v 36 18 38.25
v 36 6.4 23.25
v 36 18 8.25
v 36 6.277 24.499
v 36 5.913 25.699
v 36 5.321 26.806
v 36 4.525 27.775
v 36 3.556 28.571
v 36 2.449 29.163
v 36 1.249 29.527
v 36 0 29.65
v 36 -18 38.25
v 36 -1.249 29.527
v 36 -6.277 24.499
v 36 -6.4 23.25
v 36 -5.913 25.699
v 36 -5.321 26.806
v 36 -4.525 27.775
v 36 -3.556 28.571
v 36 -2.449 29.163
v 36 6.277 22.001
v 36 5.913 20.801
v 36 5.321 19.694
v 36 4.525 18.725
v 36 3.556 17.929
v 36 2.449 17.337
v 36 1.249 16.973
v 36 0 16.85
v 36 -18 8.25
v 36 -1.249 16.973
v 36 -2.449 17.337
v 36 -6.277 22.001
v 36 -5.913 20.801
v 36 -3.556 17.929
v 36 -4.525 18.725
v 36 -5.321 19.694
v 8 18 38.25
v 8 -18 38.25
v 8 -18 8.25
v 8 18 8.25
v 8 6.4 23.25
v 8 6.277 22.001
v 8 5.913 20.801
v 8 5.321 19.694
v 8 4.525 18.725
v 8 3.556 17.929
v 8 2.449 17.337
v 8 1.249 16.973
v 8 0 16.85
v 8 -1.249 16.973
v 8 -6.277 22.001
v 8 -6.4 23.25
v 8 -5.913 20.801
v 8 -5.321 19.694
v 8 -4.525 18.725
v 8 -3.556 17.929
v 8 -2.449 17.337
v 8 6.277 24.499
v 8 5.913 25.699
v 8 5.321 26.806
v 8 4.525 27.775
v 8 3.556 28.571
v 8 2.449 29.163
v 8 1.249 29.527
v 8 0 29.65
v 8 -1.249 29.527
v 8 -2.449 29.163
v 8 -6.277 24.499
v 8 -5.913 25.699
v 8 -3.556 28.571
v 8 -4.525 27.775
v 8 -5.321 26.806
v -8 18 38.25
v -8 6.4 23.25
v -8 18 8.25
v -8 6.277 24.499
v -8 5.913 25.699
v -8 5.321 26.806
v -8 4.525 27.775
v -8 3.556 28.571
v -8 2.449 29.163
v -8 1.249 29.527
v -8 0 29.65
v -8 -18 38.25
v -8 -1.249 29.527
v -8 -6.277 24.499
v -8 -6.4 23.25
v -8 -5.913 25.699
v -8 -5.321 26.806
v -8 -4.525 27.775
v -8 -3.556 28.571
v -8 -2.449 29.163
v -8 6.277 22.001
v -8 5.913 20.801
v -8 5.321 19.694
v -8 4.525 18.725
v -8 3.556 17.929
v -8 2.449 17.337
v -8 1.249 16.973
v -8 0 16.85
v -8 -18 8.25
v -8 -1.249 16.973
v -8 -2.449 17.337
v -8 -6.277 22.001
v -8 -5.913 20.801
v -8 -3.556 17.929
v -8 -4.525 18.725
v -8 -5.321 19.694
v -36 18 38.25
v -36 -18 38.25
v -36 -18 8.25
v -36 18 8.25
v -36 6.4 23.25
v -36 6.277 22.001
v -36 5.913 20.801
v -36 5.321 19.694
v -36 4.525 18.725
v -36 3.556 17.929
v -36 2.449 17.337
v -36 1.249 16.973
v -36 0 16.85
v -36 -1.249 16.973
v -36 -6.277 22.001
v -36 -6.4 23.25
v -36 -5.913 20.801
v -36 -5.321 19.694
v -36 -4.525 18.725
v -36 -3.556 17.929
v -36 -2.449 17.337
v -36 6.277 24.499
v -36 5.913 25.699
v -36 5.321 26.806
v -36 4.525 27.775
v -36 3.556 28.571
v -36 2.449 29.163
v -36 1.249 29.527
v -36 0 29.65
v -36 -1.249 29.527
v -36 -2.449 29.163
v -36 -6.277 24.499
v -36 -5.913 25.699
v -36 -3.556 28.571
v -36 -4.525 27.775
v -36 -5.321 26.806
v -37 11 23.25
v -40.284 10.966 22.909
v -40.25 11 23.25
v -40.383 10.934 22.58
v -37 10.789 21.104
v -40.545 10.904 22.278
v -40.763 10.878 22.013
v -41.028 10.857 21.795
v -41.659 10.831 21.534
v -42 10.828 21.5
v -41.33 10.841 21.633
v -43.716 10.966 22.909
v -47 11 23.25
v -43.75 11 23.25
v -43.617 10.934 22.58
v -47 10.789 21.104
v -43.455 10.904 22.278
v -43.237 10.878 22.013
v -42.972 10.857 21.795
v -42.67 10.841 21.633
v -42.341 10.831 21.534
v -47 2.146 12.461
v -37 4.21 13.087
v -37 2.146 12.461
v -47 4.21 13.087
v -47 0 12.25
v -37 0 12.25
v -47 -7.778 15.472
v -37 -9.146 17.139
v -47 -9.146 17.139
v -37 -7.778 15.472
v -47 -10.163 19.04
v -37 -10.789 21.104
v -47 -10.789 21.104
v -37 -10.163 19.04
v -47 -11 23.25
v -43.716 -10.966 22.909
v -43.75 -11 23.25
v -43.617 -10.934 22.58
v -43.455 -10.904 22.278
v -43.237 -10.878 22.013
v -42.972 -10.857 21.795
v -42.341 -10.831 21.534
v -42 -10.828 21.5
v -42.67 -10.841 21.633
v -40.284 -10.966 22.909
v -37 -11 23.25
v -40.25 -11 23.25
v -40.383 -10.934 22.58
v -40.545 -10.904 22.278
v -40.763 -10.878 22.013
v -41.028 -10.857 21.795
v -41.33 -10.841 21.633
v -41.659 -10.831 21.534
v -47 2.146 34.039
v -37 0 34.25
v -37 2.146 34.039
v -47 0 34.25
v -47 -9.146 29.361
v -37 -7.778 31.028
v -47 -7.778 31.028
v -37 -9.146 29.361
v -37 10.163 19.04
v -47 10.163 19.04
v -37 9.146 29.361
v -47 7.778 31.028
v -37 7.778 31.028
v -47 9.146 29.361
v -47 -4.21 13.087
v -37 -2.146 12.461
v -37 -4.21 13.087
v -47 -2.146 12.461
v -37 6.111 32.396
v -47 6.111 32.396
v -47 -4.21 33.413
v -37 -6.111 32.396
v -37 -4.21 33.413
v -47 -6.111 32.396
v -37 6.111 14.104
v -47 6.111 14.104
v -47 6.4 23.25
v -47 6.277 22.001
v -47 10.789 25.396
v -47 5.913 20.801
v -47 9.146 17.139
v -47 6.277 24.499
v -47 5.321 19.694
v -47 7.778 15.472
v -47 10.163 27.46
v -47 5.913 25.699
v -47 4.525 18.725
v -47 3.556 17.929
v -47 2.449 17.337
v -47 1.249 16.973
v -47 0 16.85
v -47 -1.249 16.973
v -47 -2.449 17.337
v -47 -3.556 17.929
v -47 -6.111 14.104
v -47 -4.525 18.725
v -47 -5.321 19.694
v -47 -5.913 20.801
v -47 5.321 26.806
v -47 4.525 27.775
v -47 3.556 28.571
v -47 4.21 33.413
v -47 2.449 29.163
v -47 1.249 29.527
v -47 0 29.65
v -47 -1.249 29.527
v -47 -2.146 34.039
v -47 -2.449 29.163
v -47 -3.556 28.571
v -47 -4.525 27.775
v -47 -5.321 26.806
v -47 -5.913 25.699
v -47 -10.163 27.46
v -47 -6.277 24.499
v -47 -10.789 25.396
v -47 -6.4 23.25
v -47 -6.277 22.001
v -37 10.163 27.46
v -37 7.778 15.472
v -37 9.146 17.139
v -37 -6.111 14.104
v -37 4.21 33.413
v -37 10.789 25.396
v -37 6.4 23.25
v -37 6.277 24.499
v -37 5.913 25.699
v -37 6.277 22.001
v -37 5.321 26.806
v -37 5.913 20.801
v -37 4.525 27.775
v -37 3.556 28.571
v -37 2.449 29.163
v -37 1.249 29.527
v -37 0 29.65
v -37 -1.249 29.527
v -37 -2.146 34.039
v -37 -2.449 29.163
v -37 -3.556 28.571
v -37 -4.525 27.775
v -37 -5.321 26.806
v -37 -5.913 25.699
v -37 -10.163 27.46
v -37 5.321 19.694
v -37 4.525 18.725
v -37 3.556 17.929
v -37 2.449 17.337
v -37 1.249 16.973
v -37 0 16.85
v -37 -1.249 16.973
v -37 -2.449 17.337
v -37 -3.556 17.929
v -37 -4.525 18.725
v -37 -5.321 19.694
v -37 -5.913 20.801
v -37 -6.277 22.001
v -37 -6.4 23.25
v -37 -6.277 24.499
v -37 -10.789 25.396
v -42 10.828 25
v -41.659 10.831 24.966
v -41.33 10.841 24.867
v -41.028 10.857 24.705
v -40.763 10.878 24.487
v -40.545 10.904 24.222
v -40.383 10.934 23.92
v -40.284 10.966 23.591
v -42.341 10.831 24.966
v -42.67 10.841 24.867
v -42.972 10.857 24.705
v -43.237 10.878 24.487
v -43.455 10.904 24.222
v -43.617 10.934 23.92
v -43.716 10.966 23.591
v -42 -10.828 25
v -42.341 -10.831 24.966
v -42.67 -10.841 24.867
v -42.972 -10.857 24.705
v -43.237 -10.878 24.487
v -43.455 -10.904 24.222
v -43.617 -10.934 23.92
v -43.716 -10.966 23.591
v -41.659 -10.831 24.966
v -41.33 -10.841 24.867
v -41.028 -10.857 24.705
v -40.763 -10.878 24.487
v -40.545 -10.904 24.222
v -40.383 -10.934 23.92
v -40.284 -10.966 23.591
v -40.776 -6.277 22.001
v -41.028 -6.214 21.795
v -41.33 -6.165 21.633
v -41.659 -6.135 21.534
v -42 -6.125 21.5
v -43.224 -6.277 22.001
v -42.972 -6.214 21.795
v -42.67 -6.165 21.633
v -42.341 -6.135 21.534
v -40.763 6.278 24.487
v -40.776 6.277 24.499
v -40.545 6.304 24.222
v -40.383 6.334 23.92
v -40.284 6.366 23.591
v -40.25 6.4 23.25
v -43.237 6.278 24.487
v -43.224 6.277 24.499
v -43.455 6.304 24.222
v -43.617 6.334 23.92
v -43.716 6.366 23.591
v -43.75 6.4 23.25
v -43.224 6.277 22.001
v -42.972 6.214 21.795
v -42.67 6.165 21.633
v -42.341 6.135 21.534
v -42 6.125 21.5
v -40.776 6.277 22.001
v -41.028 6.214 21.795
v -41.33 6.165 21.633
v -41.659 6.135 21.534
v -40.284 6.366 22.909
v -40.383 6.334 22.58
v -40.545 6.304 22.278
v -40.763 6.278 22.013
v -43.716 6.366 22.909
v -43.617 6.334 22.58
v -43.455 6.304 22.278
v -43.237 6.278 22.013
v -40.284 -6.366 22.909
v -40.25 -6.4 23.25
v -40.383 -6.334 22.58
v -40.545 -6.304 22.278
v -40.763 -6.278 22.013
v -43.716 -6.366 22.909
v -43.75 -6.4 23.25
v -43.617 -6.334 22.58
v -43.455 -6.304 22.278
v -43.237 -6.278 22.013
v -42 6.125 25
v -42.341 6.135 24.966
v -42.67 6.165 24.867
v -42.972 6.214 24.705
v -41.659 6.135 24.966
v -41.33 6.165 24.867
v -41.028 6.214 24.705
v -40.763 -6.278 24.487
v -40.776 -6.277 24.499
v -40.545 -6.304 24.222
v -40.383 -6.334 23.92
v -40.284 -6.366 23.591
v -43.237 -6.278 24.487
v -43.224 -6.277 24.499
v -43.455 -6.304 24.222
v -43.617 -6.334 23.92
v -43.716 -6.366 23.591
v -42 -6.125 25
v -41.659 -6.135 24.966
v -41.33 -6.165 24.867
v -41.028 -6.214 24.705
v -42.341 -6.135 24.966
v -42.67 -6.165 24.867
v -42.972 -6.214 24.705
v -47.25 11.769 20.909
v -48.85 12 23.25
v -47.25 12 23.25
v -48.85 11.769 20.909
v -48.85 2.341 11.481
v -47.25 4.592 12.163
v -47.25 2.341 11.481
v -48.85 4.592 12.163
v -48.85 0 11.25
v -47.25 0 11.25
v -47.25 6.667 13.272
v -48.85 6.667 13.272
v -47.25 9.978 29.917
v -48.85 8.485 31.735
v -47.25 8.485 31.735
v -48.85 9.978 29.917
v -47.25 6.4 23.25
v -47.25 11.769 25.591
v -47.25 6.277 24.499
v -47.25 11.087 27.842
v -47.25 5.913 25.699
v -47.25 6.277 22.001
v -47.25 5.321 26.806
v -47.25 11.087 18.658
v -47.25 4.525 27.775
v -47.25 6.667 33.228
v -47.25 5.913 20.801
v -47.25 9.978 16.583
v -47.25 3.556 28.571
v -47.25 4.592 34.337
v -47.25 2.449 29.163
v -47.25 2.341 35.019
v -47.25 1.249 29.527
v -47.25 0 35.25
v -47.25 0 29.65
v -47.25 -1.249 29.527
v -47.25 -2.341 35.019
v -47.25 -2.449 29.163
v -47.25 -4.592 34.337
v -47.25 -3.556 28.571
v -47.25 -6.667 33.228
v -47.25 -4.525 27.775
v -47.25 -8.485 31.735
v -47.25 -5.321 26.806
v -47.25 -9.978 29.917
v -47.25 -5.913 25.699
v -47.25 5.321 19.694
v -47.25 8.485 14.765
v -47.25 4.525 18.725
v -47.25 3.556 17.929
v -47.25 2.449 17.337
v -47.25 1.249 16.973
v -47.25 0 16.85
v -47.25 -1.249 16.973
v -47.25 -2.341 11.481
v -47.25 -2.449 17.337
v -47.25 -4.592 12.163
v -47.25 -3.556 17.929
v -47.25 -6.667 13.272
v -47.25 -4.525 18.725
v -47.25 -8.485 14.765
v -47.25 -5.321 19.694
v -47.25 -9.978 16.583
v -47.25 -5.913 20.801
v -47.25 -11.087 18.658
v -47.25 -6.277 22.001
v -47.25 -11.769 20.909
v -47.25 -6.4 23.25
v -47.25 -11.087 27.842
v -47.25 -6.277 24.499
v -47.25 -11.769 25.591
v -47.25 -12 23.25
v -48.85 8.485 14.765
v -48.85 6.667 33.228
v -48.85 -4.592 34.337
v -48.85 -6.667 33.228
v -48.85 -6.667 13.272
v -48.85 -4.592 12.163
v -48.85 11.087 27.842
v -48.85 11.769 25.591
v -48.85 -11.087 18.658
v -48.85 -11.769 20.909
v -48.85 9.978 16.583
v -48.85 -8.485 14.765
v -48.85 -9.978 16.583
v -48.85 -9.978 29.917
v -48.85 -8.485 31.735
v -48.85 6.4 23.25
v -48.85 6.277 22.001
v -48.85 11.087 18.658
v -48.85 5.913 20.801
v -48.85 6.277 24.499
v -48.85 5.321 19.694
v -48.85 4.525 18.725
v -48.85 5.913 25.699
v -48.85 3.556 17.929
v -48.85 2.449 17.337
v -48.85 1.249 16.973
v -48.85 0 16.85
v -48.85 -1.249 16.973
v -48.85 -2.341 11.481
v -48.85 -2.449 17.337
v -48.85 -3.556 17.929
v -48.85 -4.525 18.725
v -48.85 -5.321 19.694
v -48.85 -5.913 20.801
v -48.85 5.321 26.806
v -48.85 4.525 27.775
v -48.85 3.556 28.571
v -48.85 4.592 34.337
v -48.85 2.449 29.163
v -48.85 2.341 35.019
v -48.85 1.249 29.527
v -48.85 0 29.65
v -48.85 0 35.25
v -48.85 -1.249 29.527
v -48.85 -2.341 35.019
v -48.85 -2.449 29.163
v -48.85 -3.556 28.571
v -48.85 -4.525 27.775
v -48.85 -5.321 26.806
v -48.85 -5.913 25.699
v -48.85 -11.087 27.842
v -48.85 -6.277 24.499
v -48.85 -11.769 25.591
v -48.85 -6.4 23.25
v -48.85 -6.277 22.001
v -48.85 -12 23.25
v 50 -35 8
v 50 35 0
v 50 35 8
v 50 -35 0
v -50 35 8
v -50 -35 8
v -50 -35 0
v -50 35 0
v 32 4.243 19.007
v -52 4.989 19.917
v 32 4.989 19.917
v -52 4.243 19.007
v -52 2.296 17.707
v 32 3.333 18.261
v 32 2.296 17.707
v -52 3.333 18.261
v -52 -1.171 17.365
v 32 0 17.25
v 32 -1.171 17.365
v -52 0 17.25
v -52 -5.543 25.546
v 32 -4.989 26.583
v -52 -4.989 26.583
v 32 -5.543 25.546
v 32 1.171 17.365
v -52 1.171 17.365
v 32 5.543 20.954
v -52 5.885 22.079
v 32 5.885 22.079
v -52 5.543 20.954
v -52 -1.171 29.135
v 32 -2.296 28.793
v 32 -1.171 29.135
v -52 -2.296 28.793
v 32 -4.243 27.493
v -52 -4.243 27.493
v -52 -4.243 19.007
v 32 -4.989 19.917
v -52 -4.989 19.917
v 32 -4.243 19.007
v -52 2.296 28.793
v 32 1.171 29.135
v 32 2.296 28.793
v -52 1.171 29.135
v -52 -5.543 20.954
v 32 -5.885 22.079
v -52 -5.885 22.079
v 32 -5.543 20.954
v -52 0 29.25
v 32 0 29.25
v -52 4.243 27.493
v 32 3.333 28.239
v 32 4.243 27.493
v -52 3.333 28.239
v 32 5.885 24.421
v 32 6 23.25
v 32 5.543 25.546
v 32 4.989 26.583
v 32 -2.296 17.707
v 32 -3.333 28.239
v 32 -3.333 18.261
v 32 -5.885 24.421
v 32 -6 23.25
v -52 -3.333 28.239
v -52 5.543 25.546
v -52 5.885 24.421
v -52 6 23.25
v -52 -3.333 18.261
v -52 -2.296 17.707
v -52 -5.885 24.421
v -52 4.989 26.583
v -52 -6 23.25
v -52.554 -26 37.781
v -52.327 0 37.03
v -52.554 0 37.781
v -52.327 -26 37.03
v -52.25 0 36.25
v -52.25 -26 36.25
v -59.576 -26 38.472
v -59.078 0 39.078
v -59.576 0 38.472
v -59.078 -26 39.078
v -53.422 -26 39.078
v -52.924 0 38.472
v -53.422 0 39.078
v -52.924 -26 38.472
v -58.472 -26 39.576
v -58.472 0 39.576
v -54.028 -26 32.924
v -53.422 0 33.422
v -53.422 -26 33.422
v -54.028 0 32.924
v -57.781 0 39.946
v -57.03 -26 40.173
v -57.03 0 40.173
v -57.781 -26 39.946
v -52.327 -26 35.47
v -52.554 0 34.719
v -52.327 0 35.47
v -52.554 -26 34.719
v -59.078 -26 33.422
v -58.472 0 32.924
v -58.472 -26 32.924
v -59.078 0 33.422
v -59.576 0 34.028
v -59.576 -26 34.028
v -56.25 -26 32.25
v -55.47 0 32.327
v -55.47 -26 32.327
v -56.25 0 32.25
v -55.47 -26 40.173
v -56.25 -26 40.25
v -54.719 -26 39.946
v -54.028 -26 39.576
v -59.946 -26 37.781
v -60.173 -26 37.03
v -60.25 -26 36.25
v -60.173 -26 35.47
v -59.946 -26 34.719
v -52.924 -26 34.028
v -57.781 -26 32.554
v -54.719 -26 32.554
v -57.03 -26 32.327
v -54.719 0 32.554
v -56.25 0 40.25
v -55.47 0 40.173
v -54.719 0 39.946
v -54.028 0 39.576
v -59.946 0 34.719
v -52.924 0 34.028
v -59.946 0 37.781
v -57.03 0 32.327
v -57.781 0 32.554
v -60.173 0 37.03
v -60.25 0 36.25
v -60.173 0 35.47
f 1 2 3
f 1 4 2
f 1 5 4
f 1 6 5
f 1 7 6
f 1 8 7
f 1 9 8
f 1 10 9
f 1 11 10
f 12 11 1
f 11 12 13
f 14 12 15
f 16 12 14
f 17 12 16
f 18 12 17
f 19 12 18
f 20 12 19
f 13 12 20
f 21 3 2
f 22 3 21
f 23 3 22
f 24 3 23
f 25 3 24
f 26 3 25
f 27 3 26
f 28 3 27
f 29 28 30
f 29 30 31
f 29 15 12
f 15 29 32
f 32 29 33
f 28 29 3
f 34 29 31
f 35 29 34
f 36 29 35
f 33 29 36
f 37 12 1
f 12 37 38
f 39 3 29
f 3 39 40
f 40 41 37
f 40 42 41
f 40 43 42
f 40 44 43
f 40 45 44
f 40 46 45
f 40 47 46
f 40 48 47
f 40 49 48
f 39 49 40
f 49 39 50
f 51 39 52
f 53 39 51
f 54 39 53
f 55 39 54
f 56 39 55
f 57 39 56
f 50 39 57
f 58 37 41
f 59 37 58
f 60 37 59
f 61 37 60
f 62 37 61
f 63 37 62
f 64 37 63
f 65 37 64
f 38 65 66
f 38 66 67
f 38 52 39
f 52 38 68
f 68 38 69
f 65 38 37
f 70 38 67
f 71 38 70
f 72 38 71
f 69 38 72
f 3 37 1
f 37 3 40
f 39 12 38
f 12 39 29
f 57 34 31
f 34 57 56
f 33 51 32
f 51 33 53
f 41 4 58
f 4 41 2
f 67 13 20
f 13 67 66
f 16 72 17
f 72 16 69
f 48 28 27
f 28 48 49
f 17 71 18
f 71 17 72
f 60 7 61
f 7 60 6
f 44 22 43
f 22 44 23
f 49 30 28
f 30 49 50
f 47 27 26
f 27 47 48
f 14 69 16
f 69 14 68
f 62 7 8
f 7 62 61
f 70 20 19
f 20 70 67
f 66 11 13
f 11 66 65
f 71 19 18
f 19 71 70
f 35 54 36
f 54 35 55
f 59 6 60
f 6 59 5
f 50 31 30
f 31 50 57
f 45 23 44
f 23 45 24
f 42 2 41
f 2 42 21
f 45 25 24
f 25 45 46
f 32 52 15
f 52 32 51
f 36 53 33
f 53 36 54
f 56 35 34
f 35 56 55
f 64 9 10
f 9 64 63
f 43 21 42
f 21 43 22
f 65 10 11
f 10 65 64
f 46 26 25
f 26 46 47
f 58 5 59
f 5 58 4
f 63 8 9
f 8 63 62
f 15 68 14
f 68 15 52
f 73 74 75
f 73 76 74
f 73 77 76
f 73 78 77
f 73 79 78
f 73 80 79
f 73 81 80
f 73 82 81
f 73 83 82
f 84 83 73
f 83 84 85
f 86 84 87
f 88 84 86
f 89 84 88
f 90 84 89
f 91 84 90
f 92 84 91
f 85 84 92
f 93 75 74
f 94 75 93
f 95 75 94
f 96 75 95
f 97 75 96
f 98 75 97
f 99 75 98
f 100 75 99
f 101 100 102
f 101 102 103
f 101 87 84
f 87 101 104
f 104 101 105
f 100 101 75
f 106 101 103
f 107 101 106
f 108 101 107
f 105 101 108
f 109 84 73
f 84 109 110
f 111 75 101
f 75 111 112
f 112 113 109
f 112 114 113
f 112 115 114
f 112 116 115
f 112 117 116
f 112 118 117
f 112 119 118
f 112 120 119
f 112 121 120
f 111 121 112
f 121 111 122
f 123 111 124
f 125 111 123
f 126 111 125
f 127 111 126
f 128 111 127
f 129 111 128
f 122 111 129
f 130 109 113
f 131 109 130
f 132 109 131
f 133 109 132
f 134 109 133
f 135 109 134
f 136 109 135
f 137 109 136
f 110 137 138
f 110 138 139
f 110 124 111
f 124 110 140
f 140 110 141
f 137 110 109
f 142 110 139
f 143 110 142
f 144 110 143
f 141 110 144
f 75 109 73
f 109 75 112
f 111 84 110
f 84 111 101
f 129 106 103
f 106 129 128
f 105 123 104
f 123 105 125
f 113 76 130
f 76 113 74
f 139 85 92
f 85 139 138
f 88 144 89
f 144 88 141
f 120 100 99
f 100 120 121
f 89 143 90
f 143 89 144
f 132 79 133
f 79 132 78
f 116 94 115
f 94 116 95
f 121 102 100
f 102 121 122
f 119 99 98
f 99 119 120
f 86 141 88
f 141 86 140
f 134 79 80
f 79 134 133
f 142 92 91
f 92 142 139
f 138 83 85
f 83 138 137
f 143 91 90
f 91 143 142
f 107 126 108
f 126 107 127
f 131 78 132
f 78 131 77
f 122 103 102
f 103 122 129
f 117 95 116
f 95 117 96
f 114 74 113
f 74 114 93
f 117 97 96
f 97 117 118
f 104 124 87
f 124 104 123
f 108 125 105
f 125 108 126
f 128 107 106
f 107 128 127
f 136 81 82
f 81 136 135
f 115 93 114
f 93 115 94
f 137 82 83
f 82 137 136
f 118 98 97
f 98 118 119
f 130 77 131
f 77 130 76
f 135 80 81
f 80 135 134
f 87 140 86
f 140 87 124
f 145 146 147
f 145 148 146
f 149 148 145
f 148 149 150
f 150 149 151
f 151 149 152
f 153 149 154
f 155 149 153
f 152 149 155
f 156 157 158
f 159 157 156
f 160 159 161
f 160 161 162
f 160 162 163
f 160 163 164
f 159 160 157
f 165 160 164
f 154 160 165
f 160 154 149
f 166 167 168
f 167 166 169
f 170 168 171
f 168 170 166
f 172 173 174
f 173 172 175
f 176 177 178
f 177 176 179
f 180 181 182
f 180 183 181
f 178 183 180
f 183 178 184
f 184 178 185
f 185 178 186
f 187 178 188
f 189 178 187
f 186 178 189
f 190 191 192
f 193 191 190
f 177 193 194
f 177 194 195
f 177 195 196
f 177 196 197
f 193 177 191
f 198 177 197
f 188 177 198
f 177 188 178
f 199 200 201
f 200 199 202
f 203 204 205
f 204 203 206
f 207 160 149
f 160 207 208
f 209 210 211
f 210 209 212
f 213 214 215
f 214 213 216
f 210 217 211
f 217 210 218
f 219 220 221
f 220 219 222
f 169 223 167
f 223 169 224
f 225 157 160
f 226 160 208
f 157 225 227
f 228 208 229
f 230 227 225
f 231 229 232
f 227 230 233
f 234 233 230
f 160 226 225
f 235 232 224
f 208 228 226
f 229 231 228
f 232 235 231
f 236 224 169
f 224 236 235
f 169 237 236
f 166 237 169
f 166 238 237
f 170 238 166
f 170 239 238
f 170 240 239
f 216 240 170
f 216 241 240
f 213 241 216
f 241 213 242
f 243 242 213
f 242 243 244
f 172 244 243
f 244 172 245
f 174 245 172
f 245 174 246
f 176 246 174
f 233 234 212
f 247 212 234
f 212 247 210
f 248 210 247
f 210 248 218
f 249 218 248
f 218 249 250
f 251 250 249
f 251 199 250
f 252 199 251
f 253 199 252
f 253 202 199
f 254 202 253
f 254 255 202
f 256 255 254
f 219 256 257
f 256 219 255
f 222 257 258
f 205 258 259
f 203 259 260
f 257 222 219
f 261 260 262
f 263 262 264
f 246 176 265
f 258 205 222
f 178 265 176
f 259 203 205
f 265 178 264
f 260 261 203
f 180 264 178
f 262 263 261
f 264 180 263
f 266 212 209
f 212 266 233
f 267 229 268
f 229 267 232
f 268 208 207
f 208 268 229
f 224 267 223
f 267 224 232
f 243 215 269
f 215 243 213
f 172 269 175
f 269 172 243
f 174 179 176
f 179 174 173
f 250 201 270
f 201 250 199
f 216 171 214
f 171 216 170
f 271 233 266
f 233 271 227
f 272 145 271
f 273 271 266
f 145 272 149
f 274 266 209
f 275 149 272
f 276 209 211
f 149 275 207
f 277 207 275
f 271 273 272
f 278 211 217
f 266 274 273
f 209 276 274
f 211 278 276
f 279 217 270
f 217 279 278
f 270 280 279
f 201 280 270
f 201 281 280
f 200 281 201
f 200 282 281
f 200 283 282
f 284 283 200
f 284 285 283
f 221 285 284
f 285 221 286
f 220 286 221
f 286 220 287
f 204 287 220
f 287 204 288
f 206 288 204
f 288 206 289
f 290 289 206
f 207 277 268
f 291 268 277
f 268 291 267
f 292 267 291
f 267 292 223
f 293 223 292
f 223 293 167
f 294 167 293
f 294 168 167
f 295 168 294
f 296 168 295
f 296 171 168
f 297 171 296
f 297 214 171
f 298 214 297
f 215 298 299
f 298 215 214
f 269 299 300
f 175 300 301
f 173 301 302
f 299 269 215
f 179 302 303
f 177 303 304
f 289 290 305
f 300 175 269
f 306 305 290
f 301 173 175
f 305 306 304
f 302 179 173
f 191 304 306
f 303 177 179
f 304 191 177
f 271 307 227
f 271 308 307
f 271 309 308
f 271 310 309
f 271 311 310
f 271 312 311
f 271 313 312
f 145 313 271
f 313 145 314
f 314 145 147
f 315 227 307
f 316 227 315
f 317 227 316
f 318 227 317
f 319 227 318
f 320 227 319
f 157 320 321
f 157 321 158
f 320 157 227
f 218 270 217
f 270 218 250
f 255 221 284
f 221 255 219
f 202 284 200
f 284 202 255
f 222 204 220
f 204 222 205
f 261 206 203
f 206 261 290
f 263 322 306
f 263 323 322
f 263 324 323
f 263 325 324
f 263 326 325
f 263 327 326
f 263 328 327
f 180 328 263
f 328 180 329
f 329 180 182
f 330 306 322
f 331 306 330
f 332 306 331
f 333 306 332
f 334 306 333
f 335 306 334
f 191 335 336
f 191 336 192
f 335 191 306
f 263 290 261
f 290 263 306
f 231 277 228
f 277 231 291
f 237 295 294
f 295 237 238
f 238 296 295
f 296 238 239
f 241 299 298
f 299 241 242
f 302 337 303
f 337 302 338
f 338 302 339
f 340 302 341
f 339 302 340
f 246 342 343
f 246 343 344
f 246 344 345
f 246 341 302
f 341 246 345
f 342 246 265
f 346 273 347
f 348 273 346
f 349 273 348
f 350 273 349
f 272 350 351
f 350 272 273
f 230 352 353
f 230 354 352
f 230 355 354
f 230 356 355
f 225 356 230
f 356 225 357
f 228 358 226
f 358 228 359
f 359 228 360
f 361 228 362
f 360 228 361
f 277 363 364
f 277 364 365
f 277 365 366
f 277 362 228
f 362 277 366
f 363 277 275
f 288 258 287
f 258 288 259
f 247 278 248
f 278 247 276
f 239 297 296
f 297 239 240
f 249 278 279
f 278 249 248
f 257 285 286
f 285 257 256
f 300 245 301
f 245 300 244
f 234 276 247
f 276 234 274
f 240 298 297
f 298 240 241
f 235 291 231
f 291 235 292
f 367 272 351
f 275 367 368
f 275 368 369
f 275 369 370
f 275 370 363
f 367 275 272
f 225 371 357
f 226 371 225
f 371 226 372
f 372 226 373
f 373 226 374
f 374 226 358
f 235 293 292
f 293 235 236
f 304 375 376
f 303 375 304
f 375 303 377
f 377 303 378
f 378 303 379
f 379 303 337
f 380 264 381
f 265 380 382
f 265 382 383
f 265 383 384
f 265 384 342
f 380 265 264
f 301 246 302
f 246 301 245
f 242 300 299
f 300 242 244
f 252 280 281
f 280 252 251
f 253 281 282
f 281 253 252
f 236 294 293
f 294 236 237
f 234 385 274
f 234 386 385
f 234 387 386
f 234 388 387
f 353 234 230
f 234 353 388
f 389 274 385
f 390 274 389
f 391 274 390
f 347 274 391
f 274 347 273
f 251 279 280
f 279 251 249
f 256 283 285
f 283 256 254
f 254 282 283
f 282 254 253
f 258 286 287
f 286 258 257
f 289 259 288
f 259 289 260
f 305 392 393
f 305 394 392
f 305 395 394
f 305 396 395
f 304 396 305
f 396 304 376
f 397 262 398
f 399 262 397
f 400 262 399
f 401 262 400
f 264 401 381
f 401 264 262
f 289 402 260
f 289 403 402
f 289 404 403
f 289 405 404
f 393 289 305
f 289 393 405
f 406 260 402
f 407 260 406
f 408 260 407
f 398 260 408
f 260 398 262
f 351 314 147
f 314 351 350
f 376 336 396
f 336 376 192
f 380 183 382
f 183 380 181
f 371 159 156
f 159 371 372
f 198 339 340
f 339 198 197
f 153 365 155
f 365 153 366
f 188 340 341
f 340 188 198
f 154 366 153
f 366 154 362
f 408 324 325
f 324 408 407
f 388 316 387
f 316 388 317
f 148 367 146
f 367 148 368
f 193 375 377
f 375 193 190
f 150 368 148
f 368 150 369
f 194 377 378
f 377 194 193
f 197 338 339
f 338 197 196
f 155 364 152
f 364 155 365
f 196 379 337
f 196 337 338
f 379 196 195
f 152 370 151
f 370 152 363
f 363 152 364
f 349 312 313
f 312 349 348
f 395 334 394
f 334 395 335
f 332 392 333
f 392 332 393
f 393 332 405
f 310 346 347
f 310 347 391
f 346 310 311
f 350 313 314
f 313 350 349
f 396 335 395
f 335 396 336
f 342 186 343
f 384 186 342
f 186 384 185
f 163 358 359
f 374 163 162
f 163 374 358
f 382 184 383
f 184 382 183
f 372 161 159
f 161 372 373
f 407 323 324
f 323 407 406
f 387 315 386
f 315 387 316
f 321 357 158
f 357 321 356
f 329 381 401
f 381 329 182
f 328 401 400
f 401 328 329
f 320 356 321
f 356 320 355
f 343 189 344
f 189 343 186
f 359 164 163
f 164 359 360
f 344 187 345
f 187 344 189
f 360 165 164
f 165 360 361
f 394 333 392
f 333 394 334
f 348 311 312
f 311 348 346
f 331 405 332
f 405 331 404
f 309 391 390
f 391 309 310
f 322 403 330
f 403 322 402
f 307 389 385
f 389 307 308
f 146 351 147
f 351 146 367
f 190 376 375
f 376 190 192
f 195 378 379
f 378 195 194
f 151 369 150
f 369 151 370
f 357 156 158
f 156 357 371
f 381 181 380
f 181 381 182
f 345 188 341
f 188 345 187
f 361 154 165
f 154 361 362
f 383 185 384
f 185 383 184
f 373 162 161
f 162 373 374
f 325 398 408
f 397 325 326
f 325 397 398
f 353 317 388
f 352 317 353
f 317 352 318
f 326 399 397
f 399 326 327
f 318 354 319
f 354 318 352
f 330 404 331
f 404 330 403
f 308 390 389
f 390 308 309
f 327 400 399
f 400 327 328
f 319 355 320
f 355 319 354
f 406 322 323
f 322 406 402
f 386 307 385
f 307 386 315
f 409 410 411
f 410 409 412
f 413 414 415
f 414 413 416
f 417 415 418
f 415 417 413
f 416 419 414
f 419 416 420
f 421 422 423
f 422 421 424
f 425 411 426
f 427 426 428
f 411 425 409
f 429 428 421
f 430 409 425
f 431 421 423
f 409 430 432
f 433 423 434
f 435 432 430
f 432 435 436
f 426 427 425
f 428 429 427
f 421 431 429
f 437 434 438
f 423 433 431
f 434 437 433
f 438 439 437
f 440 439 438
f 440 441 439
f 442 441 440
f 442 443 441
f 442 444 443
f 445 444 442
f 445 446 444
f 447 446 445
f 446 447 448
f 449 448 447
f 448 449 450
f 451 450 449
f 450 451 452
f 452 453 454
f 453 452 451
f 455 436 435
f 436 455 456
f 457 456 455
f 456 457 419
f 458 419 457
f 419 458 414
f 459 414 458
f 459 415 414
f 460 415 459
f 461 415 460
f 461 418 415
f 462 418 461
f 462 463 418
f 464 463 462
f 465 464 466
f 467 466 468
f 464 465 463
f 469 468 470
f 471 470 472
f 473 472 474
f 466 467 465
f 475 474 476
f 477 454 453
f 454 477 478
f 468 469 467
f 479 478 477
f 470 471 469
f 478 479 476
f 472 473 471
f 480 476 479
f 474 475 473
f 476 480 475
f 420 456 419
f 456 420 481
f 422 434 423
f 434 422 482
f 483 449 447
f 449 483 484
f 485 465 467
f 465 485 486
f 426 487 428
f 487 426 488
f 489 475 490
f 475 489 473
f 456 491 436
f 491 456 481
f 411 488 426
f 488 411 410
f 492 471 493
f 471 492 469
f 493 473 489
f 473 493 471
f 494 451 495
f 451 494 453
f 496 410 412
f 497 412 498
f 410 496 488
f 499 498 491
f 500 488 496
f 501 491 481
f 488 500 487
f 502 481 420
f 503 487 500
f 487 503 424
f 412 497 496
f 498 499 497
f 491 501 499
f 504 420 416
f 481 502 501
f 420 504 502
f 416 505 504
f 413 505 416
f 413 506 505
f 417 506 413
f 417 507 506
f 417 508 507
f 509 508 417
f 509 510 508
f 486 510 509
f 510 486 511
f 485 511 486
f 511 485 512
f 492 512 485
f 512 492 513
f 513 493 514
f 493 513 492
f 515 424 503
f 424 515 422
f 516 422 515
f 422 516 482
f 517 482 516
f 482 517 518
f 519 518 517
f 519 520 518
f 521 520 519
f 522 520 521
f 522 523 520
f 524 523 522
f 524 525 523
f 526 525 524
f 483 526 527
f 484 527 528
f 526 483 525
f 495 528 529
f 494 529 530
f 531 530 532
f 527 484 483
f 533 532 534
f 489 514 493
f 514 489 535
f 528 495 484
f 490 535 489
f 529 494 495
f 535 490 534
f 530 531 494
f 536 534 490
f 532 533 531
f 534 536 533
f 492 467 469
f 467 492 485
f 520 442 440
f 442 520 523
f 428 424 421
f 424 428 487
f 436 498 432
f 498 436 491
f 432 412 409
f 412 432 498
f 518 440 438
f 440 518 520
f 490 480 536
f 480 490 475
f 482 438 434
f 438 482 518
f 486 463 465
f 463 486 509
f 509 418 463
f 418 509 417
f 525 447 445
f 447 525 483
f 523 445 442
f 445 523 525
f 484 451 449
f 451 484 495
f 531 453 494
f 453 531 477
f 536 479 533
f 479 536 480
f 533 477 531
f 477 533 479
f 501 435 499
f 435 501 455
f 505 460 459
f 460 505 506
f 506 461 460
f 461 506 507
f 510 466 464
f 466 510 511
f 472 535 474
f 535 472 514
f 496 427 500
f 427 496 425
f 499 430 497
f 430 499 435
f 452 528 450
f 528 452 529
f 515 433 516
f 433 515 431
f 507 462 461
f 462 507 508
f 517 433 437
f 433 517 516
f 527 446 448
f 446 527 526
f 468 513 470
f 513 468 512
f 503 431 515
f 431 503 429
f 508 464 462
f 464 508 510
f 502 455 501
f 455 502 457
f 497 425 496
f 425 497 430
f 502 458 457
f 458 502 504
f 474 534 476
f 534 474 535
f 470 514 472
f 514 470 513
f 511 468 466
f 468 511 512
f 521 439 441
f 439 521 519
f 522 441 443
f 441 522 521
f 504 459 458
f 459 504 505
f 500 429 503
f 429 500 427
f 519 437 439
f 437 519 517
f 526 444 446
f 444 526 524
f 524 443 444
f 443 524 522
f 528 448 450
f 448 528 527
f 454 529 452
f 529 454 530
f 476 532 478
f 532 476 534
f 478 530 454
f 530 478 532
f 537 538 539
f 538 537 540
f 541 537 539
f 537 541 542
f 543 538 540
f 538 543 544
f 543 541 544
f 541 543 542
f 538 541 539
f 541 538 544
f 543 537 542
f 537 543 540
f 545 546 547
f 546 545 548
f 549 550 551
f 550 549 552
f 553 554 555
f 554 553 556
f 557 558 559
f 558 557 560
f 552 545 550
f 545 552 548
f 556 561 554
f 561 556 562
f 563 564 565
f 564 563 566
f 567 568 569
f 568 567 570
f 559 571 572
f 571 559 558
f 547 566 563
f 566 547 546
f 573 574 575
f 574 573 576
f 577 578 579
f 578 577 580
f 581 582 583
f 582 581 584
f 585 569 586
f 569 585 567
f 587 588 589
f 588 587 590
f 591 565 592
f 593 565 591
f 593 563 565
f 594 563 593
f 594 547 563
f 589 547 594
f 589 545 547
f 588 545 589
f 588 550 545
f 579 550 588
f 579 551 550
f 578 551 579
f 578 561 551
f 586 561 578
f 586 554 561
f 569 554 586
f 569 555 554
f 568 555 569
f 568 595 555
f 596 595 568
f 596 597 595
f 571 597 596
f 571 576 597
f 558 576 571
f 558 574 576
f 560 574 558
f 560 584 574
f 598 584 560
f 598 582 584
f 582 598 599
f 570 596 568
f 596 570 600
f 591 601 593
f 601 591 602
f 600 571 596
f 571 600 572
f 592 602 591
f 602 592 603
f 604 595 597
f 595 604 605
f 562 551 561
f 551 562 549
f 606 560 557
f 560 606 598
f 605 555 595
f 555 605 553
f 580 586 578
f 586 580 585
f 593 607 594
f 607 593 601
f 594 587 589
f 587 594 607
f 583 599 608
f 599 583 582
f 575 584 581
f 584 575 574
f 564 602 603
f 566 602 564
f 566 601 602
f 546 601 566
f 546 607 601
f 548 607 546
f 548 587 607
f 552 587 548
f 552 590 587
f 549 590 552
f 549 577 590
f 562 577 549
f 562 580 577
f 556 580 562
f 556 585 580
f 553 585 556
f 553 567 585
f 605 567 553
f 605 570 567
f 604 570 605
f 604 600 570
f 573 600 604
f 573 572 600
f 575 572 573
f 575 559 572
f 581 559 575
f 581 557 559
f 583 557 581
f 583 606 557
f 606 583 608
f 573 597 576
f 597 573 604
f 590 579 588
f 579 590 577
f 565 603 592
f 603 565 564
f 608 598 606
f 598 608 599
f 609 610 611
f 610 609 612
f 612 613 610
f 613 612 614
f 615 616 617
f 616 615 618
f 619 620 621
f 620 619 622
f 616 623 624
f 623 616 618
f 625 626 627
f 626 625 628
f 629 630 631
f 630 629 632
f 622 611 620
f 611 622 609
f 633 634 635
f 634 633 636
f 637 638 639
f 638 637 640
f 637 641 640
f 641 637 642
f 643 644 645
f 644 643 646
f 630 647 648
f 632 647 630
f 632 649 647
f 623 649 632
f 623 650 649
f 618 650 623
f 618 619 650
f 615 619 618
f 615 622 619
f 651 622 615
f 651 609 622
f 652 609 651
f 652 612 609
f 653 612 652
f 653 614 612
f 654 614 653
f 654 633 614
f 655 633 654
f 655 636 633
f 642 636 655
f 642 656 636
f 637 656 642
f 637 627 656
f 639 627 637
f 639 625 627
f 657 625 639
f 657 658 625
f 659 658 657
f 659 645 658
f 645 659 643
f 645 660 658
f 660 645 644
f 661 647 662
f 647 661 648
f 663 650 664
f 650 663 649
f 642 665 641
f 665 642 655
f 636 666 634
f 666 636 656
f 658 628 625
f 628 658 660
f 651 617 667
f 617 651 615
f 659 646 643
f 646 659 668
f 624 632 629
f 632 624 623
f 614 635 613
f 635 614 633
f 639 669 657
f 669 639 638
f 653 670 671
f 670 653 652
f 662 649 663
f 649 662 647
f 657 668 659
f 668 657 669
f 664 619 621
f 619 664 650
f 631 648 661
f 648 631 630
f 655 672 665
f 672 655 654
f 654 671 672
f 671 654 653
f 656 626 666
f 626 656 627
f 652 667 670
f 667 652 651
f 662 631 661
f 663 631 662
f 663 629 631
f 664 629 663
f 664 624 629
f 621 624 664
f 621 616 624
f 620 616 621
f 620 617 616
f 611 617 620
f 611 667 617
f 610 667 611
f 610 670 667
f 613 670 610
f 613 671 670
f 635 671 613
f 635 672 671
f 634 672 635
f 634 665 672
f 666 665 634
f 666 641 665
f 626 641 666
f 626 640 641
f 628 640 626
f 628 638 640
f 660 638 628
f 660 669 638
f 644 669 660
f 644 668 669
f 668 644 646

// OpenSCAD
$fn = 32;

// ------------------------------------------------------------------------
// Machine vise: screw d12, jaws 28 x 30 mm
// Every part is its own module, assembly() places every instance.
// ------------------------------------------------------------------------

// --- part 1 ---
module vise_bed() {
  difference() {
    translate([-50, -35, 0]) cube([100, 70, 8]);
  }
}

// --- part 2 ---
module vise_jaw() {
  difference() {
    translate([-14, -18, 0]) cube([28, 36, 30]);
    translate([0, 0, 15]) rotate([0, 90, 0]) cylinder(h = 30, d = 12.8, center = true);
  }
}

// --- part 3 ---
module vise_screw() {
  translate([0, 0, -42]) cylinder(h = 84, d = 12);
}

// --- part 4 ---
module screw_collar() {
  difference() {
    cylinder(h = 10, d = 22);
    translate([0, 0, -1]) cylinder(h = 12, d = 12.8);
    translate([0, 0, 5]) rotate([90, 0, 0]) cylinder(h = 24, d = 3.5, center = true);
  }
}

// --- part 5 ---
module screw_washer() {
  difference() {
      translate([0, 0, 0]) cylinder(h = 1.6, d = 24);
      translate([0, 0, -1]) cylinder(h = 3.6, d = 12.8);
    }
}

// --- part 6 ---
module vise_handle() {
  cylinder(h = 26, d = 8);
}

// --- assembly ---
module assembly() {
  color([0.80, 0.24, 0.20]) translate([0, 0, 0]) rotate([0, 0, 0]) vise_bed();
  color([0.20, 0.45, 0.75]) translate([22, 0, 8.25]) rotate([0, 0, 0]) vise_jaw();
  color([0.25, 0.62, 0.32]) translate([-22, 0, 8.25]) rotate([0, 0, 0]) vise_jaw();
  color([0.92, 0.70, 0.18]) translate([-10, 0, 23.25]) rotate([0, 90, 0]) vise_screw();
  color([0.58, 0.35, 0.70]) translate([-47, 0, 23.25]) rotate([0, 90, 0]) screw_collar();
  color([0.16, 0.66, 0.66]) translate([-48.85, 0, 23.25]) rotate([0, 90, 0]) screw_washer();
  color([0.85, 0.48, 0.18]) translate([-56.25, 0, 36.25]) rotate([90, 0, 0]) vise_handle();
}

assembly();
